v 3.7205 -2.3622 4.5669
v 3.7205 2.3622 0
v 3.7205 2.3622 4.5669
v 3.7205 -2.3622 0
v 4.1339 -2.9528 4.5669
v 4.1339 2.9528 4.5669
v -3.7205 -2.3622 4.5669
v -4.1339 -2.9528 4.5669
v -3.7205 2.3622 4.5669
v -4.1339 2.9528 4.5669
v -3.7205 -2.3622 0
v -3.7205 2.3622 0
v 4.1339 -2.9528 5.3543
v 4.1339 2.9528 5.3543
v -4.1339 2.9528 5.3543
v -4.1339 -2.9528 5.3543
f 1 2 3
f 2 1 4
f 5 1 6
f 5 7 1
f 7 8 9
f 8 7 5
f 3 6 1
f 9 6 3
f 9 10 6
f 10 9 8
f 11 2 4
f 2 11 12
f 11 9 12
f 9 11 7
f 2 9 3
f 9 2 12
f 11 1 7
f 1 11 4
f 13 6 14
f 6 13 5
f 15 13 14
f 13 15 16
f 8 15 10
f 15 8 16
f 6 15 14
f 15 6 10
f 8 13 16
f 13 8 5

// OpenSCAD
// file: RA12131100.scad
w_body = 18.9;
h_body = 12.0;
d_body = 11.6;

w_top = 21.0;
h_top = 15.0;
d_top = 2.0;

w_switch = w_body * 0.8;
h_switch = 9.7;
d_switch = 6.0;

w_lug = 0.8;
h_lug = 3.1;
d_lug = 5.8;

lug_distance = 7.0;
lug_base_widen = 1.5;

lug_base_hole_pos = 1.0;
lug_hole_d = 1.5;
lug_hole_tall_d = 2.3;

module body() {
  translate([-w_body/2, -h_body/2])
  cube([w_body, h_body, d_body]);

  translate([-w_top/2, -h_top/2, d_body])
  cube([w_top, h_top, d_top]);
}

module switch() {
  translate([-w_switch/2, 0, d_top + d_body])
  rotate([90, 0, 0])
  linear_extrude(h_switch, center=true)
  polygon([
    [0, 0],
    [w_switch, 0],
    [w_switch*0.2, d_switch]
  ]);
}

module lug() {
  module lug_body() {
    union() {
      translate([-h_lug/2, 0])
      square([h_lug, d_lug-h_lug/2]);

      translate([-(h_lug + lug_base_widen)/2, 0])
      square([(h_lug + lug_base_widen), 0.5]);

      translate([0, d_lug-h_lug/2])
      resize([h_lug, h_lug])
      circle(5);
    }  
  }
  
  module lug_hole() {
    resize([lug_hole_d, lug_hole_d])
    circle(5);
  }
  module lug_hole_tall() {
    rotate([0, 0, 180])
    union() {      
      lug_hole();    
      translate([0, lug_hole_tall_d-lug_hole_d])    
      lug_hole();
      translate([-lug_hole_d/2, 0])
      square([lug_hole_d, lug_hole_tall_d-lug_hole_d]);
    }
  }
  
  rotate([-90, 0, 90])
  linear_extrude(w_lug, center=true)
  difference() {
    lug_body();
    translate([0, lug_base_hole_pos])
    lug_hole();
    translate([0, d_lug-h_lug/2])
    lug_hole_tall();
  }
}

module lugs() {
  lug();

  translate([lug_distance, 0])
  lug();
}

module ra12131100() {
  color([0.2, 0.2, 0.2])
  body();

  color([0.2, 0.2, 0.2])
  switch();

  color([0.8, 0.8, 0.8])
  lugs();
}
// file: ../openscad/utils.scad
module copy_mirror(vec=[0, 1, 0]) {
  children();

  mirror(vec)
  children();
}

module scale_to_kicad_inches() {
  scale([1/2.54, 1/2.54, 1/2.54])
  children();
}
// main file
use <../openscad/utils.scad>;
use <RA12131100.scad>

scale_to_kicad_inches()
color([0.2, 0.2, 0.2])
body();
